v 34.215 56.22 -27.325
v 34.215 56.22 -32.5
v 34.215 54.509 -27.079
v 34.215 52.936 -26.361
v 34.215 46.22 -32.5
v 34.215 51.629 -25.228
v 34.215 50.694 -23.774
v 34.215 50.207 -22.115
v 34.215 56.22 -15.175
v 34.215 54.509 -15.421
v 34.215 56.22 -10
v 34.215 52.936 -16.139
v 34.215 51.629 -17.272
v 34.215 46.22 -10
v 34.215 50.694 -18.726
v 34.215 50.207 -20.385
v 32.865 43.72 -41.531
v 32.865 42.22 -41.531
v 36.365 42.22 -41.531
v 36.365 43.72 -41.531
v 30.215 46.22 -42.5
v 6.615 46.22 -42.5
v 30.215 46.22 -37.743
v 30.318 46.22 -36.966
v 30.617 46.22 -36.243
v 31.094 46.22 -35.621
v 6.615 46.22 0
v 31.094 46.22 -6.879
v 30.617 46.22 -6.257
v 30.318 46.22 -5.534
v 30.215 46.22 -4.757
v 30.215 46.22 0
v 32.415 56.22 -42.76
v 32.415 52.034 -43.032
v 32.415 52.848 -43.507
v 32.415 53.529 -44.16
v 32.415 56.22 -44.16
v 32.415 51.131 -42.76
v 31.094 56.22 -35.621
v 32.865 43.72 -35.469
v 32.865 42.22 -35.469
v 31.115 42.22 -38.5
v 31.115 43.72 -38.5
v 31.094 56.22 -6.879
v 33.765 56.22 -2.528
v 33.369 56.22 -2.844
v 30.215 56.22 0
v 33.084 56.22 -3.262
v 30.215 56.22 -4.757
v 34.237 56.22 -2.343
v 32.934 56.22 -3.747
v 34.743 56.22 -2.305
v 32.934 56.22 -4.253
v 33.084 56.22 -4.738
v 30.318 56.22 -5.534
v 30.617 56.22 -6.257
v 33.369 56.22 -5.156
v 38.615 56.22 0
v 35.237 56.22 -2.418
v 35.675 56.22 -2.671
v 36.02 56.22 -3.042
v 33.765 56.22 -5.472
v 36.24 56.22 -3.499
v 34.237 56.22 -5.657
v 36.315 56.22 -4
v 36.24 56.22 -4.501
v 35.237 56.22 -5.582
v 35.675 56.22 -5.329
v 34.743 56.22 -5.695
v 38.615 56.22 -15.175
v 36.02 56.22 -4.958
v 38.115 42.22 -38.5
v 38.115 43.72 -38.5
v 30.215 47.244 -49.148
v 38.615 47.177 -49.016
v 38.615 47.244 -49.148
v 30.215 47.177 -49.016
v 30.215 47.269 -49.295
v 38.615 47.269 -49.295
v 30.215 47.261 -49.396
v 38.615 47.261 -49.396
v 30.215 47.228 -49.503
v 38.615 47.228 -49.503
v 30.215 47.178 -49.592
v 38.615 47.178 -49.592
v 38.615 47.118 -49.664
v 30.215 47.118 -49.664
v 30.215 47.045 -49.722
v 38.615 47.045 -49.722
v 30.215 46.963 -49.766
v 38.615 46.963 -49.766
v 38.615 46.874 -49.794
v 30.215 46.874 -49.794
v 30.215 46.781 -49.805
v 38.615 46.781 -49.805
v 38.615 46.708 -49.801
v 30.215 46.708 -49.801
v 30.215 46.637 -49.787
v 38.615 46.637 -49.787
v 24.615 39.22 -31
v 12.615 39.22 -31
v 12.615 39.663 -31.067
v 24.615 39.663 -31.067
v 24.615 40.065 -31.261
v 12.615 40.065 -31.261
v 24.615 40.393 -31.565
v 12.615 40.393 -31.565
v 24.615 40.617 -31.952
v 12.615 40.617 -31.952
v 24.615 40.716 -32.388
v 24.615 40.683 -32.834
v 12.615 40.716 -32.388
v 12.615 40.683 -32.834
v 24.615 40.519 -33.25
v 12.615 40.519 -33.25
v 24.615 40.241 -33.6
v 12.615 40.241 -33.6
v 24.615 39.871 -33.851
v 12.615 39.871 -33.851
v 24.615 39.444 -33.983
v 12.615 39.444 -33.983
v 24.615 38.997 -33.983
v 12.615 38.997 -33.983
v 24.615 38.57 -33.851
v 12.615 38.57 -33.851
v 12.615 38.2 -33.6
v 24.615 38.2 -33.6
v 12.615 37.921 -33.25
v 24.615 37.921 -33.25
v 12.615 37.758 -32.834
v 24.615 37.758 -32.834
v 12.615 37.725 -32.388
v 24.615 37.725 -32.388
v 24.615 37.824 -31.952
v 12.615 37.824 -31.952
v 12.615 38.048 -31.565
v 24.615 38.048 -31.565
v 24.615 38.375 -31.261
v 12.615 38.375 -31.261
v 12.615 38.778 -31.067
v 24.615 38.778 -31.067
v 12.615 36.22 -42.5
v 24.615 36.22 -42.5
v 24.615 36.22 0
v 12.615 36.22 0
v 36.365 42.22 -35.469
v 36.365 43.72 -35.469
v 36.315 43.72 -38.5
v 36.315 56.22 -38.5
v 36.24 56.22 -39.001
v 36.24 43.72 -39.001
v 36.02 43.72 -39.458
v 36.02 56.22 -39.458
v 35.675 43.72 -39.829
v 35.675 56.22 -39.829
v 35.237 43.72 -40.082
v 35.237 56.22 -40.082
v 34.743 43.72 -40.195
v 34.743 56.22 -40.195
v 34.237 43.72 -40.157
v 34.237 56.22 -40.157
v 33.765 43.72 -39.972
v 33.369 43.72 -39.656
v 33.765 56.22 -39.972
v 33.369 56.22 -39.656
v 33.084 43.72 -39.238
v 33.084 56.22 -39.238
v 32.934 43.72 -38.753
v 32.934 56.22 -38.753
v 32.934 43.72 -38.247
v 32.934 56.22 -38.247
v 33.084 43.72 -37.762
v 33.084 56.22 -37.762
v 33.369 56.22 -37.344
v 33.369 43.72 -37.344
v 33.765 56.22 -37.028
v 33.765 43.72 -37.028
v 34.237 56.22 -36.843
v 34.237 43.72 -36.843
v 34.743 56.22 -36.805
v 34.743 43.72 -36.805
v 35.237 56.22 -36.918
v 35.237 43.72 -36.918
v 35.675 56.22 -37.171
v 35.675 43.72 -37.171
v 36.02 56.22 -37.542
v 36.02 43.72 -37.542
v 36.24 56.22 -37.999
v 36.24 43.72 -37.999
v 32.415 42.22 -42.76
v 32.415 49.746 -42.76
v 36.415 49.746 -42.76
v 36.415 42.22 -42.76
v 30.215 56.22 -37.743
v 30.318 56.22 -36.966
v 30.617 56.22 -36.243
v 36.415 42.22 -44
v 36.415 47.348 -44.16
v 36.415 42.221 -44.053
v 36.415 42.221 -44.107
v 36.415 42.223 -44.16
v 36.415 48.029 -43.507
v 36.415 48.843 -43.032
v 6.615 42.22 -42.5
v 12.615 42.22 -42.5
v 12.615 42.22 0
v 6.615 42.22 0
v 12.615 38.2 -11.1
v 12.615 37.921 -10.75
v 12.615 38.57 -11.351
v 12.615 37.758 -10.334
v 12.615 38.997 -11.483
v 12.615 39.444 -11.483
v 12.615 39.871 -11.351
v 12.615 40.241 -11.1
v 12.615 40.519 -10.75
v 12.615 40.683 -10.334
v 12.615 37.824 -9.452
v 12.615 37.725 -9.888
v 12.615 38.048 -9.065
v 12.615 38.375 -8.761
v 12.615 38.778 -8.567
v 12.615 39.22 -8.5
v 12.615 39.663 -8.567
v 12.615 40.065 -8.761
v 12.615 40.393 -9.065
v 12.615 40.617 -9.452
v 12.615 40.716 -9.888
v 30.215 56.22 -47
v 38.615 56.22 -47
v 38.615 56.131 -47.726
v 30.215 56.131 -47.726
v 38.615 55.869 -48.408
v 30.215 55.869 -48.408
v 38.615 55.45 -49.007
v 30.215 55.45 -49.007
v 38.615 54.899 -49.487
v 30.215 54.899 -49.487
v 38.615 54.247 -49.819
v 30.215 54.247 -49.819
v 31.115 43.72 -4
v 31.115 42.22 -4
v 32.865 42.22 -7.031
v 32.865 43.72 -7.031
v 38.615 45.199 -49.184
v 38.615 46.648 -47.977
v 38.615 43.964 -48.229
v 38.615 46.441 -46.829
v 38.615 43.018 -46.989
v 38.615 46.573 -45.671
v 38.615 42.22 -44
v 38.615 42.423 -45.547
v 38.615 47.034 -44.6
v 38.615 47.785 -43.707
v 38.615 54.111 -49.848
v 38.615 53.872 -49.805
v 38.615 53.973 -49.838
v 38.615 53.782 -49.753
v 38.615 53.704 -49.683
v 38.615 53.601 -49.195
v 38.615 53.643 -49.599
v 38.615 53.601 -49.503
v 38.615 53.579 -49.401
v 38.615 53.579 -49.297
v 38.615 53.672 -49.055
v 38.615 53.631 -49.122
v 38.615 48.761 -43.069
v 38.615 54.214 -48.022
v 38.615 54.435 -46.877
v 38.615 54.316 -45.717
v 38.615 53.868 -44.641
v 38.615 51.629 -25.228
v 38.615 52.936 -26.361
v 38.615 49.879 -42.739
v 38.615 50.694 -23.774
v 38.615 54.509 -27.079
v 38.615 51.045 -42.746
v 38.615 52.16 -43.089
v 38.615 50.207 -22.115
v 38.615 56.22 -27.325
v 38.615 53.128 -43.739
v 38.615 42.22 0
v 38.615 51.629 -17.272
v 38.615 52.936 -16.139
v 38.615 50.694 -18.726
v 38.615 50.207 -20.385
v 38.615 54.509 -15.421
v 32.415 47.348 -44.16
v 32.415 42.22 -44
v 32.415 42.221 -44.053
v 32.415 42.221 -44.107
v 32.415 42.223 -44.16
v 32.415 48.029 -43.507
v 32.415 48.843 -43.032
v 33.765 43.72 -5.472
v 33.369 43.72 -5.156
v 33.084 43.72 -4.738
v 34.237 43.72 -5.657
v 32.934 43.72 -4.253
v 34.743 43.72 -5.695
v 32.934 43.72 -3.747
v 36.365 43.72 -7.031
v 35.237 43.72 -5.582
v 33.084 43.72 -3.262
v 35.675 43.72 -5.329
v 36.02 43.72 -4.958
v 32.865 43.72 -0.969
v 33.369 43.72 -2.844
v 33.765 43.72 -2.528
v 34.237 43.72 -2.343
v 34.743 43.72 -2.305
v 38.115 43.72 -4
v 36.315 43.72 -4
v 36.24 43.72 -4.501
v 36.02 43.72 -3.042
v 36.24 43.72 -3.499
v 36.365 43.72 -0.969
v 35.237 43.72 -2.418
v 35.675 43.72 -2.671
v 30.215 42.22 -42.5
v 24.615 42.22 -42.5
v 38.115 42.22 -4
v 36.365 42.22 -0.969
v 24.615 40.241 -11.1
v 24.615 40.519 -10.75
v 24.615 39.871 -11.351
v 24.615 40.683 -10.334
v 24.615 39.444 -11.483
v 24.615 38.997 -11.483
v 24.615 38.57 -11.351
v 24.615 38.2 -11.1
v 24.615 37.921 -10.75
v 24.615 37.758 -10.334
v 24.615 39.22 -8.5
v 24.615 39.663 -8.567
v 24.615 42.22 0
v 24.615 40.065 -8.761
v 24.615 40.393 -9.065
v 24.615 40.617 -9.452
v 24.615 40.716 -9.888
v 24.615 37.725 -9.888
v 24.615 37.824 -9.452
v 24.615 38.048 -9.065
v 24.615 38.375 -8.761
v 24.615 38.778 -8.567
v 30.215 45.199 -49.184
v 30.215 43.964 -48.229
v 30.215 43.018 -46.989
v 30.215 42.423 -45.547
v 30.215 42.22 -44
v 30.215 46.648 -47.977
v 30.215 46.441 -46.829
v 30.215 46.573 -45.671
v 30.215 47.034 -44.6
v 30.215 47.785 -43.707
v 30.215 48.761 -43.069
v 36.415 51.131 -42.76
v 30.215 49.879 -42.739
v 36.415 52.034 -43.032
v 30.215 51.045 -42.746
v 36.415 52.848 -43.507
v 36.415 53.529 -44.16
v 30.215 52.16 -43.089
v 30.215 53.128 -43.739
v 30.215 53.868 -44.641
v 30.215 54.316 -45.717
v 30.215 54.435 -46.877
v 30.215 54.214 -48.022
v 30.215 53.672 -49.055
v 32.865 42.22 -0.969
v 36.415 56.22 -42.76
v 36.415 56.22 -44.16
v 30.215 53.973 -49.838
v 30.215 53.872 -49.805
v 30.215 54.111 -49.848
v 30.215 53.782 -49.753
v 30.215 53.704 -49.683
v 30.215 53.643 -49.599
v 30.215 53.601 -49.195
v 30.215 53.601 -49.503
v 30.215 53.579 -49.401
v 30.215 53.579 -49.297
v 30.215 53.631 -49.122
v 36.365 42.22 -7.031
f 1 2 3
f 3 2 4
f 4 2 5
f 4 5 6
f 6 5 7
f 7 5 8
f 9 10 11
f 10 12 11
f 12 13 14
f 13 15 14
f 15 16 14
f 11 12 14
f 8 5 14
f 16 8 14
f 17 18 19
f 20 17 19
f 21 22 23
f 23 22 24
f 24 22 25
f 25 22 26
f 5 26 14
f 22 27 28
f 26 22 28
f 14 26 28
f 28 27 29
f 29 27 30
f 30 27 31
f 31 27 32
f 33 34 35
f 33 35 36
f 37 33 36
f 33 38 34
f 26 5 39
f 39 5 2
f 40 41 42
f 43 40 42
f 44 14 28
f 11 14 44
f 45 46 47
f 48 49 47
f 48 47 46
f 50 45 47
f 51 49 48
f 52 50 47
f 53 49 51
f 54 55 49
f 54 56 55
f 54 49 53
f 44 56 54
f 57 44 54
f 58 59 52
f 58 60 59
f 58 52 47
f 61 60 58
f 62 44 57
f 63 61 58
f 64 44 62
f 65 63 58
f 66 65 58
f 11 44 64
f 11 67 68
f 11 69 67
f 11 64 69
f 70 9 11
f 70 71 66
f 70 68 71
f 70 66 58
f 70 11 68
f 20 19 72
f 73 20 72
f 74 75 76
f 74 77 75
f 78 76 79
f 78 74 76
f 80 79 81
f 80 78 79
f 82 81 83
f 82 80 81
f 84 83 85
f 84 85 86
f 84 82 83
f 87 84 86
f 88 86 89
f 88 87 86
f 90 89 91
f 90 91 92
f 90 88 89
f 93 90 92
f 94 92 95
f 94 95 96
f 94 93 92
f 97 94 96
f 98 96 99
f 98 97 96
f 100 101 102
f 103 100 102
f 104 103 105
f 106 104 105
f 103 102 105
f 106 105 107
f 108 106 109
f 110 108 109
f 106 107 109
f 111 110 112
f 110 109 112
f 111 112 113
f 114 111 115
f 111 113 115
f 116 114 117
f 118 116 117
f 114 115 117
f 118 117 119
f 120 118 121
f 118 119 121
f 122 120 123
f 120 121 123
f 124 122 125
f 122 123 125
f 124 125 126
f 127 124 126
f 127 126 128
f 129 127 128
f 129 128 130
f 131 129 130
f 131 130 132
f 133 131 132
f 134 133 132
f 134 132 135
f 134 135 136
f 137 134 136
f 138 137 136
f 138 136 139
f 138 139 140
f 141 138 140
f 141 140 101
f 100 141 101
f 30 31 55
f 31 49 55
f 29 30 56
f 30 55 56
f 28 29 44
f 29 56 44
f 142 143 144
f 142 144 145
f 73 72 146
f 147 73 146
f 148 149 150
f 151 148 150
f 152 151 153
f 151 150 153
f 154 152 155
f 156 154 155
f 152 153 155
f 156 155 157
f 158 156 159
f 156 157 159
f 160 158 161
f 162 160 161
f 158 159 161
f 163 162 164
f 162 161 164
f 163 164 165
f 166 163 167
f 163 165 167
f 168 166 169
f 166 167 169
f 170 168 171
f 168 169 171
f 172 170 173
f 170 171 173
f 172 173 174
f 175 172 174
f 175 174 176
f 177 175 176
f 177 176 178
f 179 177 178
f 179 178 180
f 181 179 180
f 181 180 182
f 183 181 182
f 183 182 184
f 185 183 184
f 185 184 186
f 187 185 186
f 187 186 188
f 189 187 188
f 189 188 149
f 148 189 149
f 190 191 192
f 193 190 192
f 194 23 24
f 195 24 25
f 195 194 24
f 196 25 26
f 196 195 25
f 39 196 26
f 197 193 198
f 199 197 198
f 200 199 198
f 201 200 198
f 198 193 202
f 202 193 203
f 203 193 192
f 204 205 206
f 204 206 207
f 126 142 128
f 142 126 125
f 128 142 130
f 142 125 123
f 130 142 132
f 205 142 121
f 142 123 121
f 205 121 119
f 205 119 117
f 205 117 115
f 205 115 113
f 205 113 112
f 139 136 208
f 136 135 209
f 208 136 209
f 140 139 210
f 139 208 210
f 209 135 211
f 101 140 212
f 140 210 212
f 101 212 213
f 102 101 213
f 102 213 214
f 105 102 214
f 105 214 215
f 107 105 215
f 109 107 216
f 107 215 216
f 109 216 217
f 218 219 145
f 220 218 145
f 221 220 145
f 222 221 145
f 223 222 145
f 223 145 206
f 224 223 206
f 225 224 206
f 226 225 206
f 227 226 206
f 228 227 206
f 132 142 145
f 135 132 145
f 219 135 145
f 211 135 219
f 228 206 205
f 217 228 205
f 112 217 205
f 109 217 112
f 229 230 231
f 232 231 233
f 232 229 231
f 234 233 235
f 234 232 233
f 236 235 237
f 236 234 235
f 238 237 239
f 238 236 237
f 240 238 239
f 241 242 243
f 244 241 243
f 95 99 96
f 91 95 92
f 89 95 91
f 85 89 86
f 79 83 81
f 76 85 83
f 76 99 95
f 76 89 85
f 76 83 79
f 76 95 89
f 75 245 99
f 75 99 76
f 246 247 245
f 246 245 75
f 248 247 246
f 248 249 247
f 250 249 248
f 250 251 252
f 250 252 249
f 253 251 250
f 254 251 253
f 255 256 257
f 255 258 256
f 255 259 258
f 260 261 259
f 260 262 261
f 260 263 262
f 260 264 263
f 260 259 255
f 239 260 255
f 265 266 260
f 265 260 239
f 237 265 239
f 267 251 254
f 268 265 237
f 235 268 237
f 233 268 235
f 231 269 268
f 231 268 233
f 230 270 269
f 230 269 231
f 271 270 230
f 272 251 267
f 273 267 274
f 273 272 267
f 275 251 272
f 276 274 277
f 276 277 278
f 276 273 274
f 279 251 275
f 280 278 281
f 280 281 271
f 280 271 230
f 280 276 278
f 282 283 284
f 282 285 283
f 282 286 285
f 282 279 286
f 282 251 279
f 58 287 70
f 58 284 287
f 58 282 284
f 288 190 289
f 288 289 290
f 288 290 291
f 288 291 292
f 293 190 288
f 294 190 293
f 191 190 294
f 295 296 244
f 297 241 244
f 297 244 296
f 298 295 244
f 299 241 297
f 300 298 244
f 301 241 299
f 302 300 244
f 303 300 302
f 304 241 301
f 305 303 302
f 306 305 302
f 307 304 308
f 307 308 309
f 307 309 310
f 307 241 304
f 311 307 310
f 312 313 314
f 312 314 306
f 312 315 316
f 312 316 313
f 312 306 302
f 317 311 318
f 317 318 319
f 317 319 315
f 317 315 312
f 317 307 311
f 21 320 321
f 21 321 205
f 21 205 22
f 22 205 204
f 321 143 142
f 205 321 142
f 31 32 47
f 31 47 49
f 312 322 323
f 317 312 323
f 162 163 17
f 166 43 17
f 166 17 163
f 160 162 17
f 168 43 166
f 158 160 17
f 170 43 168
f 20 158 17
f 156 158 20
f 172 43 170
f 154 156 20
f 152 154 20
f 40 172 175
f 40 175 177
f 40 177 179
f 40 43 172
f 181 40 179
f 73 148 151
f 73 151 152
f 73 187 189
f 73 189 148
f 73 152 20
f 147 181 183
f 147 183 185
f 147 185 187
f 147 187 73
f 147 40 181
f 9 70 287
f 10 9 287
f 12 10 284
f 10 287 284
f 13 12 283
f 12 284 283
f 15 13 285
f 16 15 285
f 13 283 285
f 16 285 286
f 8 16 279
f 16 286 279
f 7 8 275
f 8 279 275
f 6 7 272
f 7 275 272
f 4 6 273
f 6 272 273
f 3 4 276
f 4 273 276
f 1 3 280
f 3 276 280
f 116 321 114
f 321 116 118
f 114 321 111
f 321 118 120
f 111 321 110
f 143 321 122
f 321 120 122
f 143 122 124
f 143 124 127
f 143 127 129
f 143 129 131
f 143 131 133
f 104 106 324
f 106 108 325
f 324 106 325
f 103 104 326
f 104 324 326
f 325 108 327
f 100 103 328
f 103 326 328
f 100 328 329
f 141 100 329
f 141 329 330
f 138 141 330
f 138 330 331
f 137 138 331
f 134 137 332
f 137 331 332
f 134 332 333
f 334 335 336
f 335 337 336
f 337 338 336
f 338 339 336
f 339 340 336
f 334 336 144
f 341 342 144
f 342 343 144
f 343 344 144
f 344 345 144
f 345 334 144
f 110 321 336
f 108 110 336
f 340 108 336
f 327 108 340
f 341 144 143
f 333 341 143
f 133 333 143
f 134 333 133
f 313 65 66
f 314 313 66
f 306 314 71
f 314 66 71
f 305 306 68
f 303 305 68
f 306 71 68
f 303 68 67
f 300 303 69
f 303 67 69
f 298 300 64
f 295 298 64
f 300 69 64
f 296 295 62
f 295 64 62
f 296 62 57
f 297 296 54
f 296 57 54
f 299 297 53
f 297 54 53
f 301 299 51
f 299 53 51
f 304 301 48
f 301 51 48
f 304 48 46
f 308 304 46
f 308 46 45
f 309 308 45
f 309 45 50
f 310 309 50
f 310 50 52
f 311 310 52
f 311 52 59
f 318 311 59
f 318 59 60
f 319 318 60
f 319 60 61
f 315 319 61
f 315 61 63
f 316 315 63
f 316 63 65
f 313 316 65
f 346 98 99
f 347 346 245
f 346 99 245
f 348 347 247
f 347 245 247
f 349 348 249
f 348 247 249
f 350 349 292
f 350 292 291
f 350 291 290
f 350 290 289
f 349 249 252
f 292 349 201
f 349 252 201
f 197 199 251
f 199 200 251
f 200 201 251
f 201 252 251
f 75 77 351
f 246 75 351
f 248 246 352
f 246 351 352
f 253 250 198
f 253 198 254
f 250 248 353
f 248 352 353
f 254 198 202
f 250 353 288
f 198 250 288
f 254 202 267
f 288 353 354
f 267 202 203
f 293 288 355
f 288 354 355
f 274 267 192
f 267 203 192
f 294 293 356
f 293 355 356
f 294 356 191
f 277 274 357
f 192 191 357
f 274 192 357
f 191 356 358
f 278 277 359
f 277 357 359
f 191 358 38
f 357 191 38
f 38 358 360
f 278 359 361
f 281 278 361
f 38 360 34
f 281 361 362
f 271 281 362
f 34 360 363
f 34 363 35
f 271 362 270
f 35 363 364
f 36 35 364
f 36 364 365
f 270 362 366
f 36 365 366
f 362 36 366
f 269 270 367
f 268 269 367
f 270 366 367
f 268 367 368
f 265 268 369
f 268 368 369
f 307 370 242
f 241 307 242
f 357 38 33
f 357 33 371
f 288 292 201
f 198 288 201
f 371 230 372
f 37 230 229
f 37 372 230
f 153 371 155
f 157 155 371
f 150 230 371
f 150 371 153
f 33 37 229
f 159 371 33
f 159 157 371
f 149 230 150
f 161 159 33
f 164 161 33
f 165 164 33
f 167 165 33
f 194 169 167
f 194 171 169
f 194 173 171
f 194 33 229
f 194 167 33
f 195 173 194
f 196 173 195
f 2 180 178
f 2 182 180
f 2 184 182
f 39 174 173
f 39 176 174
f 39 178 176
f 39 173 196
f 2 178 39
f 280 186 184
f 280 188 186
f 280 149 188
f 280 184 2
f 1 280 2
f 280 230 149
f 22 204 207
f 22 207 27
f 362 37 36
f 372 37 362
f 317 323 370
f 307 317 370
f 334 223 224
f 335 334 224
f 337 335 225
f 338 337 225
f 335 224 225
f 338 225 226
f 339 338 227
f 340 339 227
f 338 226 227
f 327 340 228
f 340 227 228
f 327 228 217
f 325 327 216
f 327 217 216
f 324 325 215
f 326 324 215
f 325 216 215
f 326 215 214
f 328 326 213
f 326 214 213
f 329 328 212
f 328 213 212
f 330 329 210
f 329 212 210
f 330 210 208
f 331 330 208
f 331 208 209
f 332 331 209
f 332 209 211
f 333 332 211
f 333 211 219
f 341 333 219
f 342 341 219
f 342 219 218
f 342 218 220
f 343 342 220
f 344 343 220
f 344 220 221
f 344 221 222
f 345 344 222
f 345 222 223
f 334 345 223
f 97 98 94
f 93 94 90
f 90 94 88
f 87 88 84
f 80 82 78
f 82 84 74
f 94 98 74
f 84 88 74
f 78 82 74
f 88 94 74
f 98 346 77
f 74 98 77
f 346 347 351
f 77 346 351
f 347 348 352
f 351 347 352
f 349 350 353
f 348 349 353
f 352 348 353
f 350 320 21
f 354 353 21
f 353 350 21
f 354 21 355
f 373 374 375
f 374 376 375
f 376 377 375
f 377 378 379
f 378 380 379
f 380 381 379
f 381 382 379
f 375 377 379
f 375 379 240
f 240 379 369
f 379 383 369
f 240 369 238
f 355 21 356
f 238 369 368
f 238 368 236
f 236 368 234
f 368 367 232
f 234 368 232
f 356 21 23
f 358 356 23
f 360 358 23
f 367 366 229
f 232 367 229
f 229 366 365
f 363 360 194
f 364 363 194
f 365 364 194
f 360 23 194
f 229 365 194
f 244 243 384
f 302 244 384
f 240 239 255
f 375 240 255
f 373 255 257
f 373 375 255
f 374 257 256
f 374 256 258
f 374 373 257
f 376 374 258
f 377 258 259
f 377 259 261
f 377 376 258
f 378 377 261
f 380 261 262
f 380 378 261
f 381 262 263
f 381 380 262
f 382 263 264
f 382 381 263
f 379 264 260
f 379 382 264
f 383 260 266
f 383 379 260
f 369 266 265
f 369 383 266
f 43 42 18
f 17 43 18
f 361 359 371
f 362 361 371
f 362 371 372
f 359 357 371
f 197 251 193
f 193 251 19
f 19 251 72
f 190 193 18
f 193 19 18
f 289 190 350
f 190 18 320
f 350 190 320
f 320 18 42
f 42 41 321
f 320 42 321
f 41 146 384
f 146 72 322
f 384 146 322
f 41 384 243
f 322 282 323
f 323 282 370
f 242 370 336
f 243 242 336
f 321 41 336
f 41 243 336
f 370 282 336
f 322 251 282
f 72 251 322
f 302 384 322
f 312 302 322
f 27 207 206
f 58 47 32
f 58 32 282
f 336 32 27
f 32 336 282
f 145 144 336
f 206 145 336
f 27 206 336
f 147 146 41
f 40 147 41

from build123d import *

# Parameters (mm, degrees)
BOSS_EXTRU_1_DEPTH      = 42.5
D_GAGEMENT_M31_D        = 3
ESQUISSE10_W            = 4
ESQUISSE10_H            = 10
BOSS_EXTRU_2_DEPTH      = 10
ESQUISSE12_R            = 6.075
ENL_V_MAT_EXTRU_3_DEPTH = 82.036925103
D_GAGEMENT_M33_D        = 3.4
ENL_V_MAT_EXTRU_1_DEPTH = 1.5
CHANFREIN1_SIZE         = 4
ESQUISSE13_W            = 8
ESQUISSE13_H            = 4
ENL_V_MAT_EXTRU_4_DEPTH = 81.362549025
ESQUISSE14_W            = 8.4
ESQUISSE14_H            = 14
BOSS_EXTRU_3_DEPTH      = 7.5
ESQUISSE15_R            = 4
ENL_V_MAT_EXTRU_5_DEPTH = 79.852350822
CONG_2_R                = 3
CONG_3_R                = 6
CONG_4_R                = 0.5
ESQUISSE16_W            = 4
ESQUISSE16_H            = 1.4
ENL_V_MAT_EXTRU_6_DEPTH = 67.151912076
CONG_5_R                = 3


# Some blends are built 0.0001 mm under size
with BuildPart() as part:
    # Esquisse1 → Boss.-Extru.1 (new body)
    with BuildSketch(Plane(origin=(0, 0, 0), x_dir=(1, 0, 0), z_dir=(0, 0, -1))):
        Polygon((-1.384510159, -46.220398701), (38.615489841, -46.220398701), (38.615489841, -42.220398701), (24.615489841, -42.220398701), (24.615489841, -36.220398701), (12.615489841, -36.220398701), (12.615489841, -42.220398701), (-1.384510159, -42.220398701), align=None)
    extrude(amount=BOSS_EXTRU_1_DEPTH)

    # Dégagement M31 (through all)
    with Locations(Plane(origin=(24.615489841, 0, 0), x_dir=(0, 0, -1), z_dir=(1, 0, 0))):
        with Locations((10, 39.220398701), (32.5, 39.220398701)):
            Hole(D_GAGEMENT_M31_D / 2)

    # Esquisse10 → Boss.-Extru.2 (add)
    with BuildSketch(Plane(origin=(0, 46.220398701, 0), x_dir=(1, 0, 0), z_dir=(0, 1, 0))):
        with Locations((32.215489841, 37.5)):
            Rectangle(ESQUISSE10_W, ESQUISSE10_H)
        Polygon((34.215489841, 10), (34.215489841, 0), (38.615489841, 0), (38.615489841, 42.5), (34.215489841, 42.5), (34.215489841, 32.5), align=None)
        with Locations((32.215489841, 5)):
            Rectangle(ESQUISSE10_W, ESQUISSE10_H)
    extrude(amount=BOSS_EXTRU_2_DEPTH)

    # Esquisse12 → Enlèv. mat.-Extru.3 (cut, through all)
    with BuildSketch(Plane(origin=(38.615489841, 0, 0), x_dir=(0, 0, -1), z_dir=(1, 0, 0))):
        with Locations((21.25, 56.220398701)):
            Circle(ESQUISSE12_R)
    extrude(amount=-ENL_V_MAT_EXTRU_3_DEPTH, mode=Mode.SUBTRACT)

    # Dégagement M33 (through all)
    with Locations(Plane(origin=(0, 42.220398701, 0), x_dir=(-1, 0, 0), z_dir=(0, -1, 0))):
        with Locations((3, -59.94627318), (-34.615489841, 38.5), (-2.615489841, 38.5), (-2.615489841, 4), (-34.615489841, 4)):
            Hole(D_GAGEMENT_M33_D / 2)

    # Esquisse9 → Enlèv. mat.-Extru.1 (cut)
    with BuildSketch(Plane.XZ.offset(-42.220398701)):
        Polygon((32.865489841, -35.468911087), (31.115489841, -38.5), (32.865489841, -41.531088913), (36.365489841, -41.531088913), (38.115489841, -38.5), (36.365489841, -35.468911087), align=None)
        Polygon((4.365489841, -35.468911087), (0.865489841, -35.468911087), (-0.884510159, -38.5), (0.865489841, -41.531088913), (4.365489841, -41.531088913), (6.115489841, -38.5), align=None)
        Polygon((32.865489841, -0.968911087), (31.115489841, -4), (32.865489841, -7.031088913), (36.365489841, -7.031088913), (38.115489841, -4), (36.365489841, -0.968911087), align=None)
        Polygon((4.365489841, -0.968911087), (0.865489841, -0.968911087), (-0.884510159, -4), (0.865489841, -7.031088913), (4.365489841, -7.031088913), (6.115489841, -4), align=None)
    extrude(amount=-ENL_V_MAT_EXTRU_1_DEPTH, mode=Mode.SUBTRACT)

    # Chanfrein1
    chanfrein1_edges = [part.edges().sort_by_distance(p)[0] for p in [
        (30.215489841, 51.220398701, -32.5),
        (30.215489841, 51.220398701, -10),
    ]]
    chamfer(chanfrein1_edges, length=CHANFREIN1_SIZE - 0.0001)  # a hair under: the kernel refuses the full size

    # Esquisse13 → Enlèv. mat.-Extru.4 (cut, through all)
    with BuildSketch(Plane(origin=(0, 0, -42.5), x_dir=(-1, 0, 0), z_dir=(0, 0, -1))):
        with Locations((-2.615489841, 44.220398701)):
            Rectangle(ESQUISSE13_W, ESQUISSE13_H)
    extrude(amount=-ENL_V_MAT_EXTRU_4_DEPTH, mode=Mode.SUBTRACT)

    # Esquisse14 → Boss.-Extru.3 (add)
    with BuildSketch(Plane(origin=(0, 0, -42.5), x_dir=(-1, 0, 0), z_dir=(0, 0, -1))):
        with Locations((-34.415489841, 49.220398701)):
            Rectangle(ESQUISSE14_W, ESQUISSE14_H)
    extrude(amount=BOSS_EXTRU_3_DEPTH)

    # Esquisse15 → Enlèv. mat.-Extru.5 (cut, through all)
    with BuildSketch(Plane.ZY.offset(-30.215489841)):
        with Locations((-46.7, 50.438462286)):
            Circle(ESQUISSE15_R)
    extrude(amount=-ENL_V_MAT_EXTRU_5_DEPTH, mode=Mode.SUBTRACT)

    # Congé2
    cong_2_edges = [part.edges().sort_by_distance(p)[0] for p in [
        (34.415489841, 56.220398701, -50),
    ]]
    fillet(cong_2_edges, radius=CONG_2_R)

    # Congé3
    # the kernel refuses this fillet: 6 mm, written as the material it takes off along each edge
    with BuildSketch(Plane(origin=(53.615489841, 42.220398701, -50), x_dir=(0, 1, 0), z_dir=(-1, 0, 0))) as cong_3_piece_1:
        with BuildLine():
            CenterArc((CONG_3_R, -CONG_3_R), CONG_3_R, 90, 90)
            Line((0, -CONG_3_R), (0, 0))
            Line((0, 0), (CONG_3_R, 0))
        make_face()
    extrude(amount=38.4, mode=Mode.SUBTRACT)

    # Congé4
    cong_4_edges = [part.edges().sort_by_distance(p)[0] for p in [
        (34.415489841, 52.698993197, -50),
        (34.415489841, 48.177709694, -49.999848135),
    ]]
    fillet(cong_4_edges, radius=CONG_4_R)

    # Esquisse16 → Enlèv. mat.-Extru.6 (cut, through all)
    with BuildSketch(Plane(origin=(0, 56.220398701, 0), x_dir=(1, 0, 0), z_dir=(0, 1, 0))):
        with Locations((34.415489841, 43.46034171)):
            Rectangle(ESQUISSE16_W, ESQUISSE16_H)
    extrude(amount=-ENL_V_MAT_EXTRU_6_DEPTH, mode=Mode.SUBTRACT)

    # Congé5
    cong_5_edges = [part.edges().sort_by_distance(p)[0] for p in [
        (30.215489841, 51.220398701, -36.4999),
        (30.215489841, 51.220398701, -6.0001),
    ]]
    fillet(cong_5_edges, radius=CONG_5_R)


solid = part.part
